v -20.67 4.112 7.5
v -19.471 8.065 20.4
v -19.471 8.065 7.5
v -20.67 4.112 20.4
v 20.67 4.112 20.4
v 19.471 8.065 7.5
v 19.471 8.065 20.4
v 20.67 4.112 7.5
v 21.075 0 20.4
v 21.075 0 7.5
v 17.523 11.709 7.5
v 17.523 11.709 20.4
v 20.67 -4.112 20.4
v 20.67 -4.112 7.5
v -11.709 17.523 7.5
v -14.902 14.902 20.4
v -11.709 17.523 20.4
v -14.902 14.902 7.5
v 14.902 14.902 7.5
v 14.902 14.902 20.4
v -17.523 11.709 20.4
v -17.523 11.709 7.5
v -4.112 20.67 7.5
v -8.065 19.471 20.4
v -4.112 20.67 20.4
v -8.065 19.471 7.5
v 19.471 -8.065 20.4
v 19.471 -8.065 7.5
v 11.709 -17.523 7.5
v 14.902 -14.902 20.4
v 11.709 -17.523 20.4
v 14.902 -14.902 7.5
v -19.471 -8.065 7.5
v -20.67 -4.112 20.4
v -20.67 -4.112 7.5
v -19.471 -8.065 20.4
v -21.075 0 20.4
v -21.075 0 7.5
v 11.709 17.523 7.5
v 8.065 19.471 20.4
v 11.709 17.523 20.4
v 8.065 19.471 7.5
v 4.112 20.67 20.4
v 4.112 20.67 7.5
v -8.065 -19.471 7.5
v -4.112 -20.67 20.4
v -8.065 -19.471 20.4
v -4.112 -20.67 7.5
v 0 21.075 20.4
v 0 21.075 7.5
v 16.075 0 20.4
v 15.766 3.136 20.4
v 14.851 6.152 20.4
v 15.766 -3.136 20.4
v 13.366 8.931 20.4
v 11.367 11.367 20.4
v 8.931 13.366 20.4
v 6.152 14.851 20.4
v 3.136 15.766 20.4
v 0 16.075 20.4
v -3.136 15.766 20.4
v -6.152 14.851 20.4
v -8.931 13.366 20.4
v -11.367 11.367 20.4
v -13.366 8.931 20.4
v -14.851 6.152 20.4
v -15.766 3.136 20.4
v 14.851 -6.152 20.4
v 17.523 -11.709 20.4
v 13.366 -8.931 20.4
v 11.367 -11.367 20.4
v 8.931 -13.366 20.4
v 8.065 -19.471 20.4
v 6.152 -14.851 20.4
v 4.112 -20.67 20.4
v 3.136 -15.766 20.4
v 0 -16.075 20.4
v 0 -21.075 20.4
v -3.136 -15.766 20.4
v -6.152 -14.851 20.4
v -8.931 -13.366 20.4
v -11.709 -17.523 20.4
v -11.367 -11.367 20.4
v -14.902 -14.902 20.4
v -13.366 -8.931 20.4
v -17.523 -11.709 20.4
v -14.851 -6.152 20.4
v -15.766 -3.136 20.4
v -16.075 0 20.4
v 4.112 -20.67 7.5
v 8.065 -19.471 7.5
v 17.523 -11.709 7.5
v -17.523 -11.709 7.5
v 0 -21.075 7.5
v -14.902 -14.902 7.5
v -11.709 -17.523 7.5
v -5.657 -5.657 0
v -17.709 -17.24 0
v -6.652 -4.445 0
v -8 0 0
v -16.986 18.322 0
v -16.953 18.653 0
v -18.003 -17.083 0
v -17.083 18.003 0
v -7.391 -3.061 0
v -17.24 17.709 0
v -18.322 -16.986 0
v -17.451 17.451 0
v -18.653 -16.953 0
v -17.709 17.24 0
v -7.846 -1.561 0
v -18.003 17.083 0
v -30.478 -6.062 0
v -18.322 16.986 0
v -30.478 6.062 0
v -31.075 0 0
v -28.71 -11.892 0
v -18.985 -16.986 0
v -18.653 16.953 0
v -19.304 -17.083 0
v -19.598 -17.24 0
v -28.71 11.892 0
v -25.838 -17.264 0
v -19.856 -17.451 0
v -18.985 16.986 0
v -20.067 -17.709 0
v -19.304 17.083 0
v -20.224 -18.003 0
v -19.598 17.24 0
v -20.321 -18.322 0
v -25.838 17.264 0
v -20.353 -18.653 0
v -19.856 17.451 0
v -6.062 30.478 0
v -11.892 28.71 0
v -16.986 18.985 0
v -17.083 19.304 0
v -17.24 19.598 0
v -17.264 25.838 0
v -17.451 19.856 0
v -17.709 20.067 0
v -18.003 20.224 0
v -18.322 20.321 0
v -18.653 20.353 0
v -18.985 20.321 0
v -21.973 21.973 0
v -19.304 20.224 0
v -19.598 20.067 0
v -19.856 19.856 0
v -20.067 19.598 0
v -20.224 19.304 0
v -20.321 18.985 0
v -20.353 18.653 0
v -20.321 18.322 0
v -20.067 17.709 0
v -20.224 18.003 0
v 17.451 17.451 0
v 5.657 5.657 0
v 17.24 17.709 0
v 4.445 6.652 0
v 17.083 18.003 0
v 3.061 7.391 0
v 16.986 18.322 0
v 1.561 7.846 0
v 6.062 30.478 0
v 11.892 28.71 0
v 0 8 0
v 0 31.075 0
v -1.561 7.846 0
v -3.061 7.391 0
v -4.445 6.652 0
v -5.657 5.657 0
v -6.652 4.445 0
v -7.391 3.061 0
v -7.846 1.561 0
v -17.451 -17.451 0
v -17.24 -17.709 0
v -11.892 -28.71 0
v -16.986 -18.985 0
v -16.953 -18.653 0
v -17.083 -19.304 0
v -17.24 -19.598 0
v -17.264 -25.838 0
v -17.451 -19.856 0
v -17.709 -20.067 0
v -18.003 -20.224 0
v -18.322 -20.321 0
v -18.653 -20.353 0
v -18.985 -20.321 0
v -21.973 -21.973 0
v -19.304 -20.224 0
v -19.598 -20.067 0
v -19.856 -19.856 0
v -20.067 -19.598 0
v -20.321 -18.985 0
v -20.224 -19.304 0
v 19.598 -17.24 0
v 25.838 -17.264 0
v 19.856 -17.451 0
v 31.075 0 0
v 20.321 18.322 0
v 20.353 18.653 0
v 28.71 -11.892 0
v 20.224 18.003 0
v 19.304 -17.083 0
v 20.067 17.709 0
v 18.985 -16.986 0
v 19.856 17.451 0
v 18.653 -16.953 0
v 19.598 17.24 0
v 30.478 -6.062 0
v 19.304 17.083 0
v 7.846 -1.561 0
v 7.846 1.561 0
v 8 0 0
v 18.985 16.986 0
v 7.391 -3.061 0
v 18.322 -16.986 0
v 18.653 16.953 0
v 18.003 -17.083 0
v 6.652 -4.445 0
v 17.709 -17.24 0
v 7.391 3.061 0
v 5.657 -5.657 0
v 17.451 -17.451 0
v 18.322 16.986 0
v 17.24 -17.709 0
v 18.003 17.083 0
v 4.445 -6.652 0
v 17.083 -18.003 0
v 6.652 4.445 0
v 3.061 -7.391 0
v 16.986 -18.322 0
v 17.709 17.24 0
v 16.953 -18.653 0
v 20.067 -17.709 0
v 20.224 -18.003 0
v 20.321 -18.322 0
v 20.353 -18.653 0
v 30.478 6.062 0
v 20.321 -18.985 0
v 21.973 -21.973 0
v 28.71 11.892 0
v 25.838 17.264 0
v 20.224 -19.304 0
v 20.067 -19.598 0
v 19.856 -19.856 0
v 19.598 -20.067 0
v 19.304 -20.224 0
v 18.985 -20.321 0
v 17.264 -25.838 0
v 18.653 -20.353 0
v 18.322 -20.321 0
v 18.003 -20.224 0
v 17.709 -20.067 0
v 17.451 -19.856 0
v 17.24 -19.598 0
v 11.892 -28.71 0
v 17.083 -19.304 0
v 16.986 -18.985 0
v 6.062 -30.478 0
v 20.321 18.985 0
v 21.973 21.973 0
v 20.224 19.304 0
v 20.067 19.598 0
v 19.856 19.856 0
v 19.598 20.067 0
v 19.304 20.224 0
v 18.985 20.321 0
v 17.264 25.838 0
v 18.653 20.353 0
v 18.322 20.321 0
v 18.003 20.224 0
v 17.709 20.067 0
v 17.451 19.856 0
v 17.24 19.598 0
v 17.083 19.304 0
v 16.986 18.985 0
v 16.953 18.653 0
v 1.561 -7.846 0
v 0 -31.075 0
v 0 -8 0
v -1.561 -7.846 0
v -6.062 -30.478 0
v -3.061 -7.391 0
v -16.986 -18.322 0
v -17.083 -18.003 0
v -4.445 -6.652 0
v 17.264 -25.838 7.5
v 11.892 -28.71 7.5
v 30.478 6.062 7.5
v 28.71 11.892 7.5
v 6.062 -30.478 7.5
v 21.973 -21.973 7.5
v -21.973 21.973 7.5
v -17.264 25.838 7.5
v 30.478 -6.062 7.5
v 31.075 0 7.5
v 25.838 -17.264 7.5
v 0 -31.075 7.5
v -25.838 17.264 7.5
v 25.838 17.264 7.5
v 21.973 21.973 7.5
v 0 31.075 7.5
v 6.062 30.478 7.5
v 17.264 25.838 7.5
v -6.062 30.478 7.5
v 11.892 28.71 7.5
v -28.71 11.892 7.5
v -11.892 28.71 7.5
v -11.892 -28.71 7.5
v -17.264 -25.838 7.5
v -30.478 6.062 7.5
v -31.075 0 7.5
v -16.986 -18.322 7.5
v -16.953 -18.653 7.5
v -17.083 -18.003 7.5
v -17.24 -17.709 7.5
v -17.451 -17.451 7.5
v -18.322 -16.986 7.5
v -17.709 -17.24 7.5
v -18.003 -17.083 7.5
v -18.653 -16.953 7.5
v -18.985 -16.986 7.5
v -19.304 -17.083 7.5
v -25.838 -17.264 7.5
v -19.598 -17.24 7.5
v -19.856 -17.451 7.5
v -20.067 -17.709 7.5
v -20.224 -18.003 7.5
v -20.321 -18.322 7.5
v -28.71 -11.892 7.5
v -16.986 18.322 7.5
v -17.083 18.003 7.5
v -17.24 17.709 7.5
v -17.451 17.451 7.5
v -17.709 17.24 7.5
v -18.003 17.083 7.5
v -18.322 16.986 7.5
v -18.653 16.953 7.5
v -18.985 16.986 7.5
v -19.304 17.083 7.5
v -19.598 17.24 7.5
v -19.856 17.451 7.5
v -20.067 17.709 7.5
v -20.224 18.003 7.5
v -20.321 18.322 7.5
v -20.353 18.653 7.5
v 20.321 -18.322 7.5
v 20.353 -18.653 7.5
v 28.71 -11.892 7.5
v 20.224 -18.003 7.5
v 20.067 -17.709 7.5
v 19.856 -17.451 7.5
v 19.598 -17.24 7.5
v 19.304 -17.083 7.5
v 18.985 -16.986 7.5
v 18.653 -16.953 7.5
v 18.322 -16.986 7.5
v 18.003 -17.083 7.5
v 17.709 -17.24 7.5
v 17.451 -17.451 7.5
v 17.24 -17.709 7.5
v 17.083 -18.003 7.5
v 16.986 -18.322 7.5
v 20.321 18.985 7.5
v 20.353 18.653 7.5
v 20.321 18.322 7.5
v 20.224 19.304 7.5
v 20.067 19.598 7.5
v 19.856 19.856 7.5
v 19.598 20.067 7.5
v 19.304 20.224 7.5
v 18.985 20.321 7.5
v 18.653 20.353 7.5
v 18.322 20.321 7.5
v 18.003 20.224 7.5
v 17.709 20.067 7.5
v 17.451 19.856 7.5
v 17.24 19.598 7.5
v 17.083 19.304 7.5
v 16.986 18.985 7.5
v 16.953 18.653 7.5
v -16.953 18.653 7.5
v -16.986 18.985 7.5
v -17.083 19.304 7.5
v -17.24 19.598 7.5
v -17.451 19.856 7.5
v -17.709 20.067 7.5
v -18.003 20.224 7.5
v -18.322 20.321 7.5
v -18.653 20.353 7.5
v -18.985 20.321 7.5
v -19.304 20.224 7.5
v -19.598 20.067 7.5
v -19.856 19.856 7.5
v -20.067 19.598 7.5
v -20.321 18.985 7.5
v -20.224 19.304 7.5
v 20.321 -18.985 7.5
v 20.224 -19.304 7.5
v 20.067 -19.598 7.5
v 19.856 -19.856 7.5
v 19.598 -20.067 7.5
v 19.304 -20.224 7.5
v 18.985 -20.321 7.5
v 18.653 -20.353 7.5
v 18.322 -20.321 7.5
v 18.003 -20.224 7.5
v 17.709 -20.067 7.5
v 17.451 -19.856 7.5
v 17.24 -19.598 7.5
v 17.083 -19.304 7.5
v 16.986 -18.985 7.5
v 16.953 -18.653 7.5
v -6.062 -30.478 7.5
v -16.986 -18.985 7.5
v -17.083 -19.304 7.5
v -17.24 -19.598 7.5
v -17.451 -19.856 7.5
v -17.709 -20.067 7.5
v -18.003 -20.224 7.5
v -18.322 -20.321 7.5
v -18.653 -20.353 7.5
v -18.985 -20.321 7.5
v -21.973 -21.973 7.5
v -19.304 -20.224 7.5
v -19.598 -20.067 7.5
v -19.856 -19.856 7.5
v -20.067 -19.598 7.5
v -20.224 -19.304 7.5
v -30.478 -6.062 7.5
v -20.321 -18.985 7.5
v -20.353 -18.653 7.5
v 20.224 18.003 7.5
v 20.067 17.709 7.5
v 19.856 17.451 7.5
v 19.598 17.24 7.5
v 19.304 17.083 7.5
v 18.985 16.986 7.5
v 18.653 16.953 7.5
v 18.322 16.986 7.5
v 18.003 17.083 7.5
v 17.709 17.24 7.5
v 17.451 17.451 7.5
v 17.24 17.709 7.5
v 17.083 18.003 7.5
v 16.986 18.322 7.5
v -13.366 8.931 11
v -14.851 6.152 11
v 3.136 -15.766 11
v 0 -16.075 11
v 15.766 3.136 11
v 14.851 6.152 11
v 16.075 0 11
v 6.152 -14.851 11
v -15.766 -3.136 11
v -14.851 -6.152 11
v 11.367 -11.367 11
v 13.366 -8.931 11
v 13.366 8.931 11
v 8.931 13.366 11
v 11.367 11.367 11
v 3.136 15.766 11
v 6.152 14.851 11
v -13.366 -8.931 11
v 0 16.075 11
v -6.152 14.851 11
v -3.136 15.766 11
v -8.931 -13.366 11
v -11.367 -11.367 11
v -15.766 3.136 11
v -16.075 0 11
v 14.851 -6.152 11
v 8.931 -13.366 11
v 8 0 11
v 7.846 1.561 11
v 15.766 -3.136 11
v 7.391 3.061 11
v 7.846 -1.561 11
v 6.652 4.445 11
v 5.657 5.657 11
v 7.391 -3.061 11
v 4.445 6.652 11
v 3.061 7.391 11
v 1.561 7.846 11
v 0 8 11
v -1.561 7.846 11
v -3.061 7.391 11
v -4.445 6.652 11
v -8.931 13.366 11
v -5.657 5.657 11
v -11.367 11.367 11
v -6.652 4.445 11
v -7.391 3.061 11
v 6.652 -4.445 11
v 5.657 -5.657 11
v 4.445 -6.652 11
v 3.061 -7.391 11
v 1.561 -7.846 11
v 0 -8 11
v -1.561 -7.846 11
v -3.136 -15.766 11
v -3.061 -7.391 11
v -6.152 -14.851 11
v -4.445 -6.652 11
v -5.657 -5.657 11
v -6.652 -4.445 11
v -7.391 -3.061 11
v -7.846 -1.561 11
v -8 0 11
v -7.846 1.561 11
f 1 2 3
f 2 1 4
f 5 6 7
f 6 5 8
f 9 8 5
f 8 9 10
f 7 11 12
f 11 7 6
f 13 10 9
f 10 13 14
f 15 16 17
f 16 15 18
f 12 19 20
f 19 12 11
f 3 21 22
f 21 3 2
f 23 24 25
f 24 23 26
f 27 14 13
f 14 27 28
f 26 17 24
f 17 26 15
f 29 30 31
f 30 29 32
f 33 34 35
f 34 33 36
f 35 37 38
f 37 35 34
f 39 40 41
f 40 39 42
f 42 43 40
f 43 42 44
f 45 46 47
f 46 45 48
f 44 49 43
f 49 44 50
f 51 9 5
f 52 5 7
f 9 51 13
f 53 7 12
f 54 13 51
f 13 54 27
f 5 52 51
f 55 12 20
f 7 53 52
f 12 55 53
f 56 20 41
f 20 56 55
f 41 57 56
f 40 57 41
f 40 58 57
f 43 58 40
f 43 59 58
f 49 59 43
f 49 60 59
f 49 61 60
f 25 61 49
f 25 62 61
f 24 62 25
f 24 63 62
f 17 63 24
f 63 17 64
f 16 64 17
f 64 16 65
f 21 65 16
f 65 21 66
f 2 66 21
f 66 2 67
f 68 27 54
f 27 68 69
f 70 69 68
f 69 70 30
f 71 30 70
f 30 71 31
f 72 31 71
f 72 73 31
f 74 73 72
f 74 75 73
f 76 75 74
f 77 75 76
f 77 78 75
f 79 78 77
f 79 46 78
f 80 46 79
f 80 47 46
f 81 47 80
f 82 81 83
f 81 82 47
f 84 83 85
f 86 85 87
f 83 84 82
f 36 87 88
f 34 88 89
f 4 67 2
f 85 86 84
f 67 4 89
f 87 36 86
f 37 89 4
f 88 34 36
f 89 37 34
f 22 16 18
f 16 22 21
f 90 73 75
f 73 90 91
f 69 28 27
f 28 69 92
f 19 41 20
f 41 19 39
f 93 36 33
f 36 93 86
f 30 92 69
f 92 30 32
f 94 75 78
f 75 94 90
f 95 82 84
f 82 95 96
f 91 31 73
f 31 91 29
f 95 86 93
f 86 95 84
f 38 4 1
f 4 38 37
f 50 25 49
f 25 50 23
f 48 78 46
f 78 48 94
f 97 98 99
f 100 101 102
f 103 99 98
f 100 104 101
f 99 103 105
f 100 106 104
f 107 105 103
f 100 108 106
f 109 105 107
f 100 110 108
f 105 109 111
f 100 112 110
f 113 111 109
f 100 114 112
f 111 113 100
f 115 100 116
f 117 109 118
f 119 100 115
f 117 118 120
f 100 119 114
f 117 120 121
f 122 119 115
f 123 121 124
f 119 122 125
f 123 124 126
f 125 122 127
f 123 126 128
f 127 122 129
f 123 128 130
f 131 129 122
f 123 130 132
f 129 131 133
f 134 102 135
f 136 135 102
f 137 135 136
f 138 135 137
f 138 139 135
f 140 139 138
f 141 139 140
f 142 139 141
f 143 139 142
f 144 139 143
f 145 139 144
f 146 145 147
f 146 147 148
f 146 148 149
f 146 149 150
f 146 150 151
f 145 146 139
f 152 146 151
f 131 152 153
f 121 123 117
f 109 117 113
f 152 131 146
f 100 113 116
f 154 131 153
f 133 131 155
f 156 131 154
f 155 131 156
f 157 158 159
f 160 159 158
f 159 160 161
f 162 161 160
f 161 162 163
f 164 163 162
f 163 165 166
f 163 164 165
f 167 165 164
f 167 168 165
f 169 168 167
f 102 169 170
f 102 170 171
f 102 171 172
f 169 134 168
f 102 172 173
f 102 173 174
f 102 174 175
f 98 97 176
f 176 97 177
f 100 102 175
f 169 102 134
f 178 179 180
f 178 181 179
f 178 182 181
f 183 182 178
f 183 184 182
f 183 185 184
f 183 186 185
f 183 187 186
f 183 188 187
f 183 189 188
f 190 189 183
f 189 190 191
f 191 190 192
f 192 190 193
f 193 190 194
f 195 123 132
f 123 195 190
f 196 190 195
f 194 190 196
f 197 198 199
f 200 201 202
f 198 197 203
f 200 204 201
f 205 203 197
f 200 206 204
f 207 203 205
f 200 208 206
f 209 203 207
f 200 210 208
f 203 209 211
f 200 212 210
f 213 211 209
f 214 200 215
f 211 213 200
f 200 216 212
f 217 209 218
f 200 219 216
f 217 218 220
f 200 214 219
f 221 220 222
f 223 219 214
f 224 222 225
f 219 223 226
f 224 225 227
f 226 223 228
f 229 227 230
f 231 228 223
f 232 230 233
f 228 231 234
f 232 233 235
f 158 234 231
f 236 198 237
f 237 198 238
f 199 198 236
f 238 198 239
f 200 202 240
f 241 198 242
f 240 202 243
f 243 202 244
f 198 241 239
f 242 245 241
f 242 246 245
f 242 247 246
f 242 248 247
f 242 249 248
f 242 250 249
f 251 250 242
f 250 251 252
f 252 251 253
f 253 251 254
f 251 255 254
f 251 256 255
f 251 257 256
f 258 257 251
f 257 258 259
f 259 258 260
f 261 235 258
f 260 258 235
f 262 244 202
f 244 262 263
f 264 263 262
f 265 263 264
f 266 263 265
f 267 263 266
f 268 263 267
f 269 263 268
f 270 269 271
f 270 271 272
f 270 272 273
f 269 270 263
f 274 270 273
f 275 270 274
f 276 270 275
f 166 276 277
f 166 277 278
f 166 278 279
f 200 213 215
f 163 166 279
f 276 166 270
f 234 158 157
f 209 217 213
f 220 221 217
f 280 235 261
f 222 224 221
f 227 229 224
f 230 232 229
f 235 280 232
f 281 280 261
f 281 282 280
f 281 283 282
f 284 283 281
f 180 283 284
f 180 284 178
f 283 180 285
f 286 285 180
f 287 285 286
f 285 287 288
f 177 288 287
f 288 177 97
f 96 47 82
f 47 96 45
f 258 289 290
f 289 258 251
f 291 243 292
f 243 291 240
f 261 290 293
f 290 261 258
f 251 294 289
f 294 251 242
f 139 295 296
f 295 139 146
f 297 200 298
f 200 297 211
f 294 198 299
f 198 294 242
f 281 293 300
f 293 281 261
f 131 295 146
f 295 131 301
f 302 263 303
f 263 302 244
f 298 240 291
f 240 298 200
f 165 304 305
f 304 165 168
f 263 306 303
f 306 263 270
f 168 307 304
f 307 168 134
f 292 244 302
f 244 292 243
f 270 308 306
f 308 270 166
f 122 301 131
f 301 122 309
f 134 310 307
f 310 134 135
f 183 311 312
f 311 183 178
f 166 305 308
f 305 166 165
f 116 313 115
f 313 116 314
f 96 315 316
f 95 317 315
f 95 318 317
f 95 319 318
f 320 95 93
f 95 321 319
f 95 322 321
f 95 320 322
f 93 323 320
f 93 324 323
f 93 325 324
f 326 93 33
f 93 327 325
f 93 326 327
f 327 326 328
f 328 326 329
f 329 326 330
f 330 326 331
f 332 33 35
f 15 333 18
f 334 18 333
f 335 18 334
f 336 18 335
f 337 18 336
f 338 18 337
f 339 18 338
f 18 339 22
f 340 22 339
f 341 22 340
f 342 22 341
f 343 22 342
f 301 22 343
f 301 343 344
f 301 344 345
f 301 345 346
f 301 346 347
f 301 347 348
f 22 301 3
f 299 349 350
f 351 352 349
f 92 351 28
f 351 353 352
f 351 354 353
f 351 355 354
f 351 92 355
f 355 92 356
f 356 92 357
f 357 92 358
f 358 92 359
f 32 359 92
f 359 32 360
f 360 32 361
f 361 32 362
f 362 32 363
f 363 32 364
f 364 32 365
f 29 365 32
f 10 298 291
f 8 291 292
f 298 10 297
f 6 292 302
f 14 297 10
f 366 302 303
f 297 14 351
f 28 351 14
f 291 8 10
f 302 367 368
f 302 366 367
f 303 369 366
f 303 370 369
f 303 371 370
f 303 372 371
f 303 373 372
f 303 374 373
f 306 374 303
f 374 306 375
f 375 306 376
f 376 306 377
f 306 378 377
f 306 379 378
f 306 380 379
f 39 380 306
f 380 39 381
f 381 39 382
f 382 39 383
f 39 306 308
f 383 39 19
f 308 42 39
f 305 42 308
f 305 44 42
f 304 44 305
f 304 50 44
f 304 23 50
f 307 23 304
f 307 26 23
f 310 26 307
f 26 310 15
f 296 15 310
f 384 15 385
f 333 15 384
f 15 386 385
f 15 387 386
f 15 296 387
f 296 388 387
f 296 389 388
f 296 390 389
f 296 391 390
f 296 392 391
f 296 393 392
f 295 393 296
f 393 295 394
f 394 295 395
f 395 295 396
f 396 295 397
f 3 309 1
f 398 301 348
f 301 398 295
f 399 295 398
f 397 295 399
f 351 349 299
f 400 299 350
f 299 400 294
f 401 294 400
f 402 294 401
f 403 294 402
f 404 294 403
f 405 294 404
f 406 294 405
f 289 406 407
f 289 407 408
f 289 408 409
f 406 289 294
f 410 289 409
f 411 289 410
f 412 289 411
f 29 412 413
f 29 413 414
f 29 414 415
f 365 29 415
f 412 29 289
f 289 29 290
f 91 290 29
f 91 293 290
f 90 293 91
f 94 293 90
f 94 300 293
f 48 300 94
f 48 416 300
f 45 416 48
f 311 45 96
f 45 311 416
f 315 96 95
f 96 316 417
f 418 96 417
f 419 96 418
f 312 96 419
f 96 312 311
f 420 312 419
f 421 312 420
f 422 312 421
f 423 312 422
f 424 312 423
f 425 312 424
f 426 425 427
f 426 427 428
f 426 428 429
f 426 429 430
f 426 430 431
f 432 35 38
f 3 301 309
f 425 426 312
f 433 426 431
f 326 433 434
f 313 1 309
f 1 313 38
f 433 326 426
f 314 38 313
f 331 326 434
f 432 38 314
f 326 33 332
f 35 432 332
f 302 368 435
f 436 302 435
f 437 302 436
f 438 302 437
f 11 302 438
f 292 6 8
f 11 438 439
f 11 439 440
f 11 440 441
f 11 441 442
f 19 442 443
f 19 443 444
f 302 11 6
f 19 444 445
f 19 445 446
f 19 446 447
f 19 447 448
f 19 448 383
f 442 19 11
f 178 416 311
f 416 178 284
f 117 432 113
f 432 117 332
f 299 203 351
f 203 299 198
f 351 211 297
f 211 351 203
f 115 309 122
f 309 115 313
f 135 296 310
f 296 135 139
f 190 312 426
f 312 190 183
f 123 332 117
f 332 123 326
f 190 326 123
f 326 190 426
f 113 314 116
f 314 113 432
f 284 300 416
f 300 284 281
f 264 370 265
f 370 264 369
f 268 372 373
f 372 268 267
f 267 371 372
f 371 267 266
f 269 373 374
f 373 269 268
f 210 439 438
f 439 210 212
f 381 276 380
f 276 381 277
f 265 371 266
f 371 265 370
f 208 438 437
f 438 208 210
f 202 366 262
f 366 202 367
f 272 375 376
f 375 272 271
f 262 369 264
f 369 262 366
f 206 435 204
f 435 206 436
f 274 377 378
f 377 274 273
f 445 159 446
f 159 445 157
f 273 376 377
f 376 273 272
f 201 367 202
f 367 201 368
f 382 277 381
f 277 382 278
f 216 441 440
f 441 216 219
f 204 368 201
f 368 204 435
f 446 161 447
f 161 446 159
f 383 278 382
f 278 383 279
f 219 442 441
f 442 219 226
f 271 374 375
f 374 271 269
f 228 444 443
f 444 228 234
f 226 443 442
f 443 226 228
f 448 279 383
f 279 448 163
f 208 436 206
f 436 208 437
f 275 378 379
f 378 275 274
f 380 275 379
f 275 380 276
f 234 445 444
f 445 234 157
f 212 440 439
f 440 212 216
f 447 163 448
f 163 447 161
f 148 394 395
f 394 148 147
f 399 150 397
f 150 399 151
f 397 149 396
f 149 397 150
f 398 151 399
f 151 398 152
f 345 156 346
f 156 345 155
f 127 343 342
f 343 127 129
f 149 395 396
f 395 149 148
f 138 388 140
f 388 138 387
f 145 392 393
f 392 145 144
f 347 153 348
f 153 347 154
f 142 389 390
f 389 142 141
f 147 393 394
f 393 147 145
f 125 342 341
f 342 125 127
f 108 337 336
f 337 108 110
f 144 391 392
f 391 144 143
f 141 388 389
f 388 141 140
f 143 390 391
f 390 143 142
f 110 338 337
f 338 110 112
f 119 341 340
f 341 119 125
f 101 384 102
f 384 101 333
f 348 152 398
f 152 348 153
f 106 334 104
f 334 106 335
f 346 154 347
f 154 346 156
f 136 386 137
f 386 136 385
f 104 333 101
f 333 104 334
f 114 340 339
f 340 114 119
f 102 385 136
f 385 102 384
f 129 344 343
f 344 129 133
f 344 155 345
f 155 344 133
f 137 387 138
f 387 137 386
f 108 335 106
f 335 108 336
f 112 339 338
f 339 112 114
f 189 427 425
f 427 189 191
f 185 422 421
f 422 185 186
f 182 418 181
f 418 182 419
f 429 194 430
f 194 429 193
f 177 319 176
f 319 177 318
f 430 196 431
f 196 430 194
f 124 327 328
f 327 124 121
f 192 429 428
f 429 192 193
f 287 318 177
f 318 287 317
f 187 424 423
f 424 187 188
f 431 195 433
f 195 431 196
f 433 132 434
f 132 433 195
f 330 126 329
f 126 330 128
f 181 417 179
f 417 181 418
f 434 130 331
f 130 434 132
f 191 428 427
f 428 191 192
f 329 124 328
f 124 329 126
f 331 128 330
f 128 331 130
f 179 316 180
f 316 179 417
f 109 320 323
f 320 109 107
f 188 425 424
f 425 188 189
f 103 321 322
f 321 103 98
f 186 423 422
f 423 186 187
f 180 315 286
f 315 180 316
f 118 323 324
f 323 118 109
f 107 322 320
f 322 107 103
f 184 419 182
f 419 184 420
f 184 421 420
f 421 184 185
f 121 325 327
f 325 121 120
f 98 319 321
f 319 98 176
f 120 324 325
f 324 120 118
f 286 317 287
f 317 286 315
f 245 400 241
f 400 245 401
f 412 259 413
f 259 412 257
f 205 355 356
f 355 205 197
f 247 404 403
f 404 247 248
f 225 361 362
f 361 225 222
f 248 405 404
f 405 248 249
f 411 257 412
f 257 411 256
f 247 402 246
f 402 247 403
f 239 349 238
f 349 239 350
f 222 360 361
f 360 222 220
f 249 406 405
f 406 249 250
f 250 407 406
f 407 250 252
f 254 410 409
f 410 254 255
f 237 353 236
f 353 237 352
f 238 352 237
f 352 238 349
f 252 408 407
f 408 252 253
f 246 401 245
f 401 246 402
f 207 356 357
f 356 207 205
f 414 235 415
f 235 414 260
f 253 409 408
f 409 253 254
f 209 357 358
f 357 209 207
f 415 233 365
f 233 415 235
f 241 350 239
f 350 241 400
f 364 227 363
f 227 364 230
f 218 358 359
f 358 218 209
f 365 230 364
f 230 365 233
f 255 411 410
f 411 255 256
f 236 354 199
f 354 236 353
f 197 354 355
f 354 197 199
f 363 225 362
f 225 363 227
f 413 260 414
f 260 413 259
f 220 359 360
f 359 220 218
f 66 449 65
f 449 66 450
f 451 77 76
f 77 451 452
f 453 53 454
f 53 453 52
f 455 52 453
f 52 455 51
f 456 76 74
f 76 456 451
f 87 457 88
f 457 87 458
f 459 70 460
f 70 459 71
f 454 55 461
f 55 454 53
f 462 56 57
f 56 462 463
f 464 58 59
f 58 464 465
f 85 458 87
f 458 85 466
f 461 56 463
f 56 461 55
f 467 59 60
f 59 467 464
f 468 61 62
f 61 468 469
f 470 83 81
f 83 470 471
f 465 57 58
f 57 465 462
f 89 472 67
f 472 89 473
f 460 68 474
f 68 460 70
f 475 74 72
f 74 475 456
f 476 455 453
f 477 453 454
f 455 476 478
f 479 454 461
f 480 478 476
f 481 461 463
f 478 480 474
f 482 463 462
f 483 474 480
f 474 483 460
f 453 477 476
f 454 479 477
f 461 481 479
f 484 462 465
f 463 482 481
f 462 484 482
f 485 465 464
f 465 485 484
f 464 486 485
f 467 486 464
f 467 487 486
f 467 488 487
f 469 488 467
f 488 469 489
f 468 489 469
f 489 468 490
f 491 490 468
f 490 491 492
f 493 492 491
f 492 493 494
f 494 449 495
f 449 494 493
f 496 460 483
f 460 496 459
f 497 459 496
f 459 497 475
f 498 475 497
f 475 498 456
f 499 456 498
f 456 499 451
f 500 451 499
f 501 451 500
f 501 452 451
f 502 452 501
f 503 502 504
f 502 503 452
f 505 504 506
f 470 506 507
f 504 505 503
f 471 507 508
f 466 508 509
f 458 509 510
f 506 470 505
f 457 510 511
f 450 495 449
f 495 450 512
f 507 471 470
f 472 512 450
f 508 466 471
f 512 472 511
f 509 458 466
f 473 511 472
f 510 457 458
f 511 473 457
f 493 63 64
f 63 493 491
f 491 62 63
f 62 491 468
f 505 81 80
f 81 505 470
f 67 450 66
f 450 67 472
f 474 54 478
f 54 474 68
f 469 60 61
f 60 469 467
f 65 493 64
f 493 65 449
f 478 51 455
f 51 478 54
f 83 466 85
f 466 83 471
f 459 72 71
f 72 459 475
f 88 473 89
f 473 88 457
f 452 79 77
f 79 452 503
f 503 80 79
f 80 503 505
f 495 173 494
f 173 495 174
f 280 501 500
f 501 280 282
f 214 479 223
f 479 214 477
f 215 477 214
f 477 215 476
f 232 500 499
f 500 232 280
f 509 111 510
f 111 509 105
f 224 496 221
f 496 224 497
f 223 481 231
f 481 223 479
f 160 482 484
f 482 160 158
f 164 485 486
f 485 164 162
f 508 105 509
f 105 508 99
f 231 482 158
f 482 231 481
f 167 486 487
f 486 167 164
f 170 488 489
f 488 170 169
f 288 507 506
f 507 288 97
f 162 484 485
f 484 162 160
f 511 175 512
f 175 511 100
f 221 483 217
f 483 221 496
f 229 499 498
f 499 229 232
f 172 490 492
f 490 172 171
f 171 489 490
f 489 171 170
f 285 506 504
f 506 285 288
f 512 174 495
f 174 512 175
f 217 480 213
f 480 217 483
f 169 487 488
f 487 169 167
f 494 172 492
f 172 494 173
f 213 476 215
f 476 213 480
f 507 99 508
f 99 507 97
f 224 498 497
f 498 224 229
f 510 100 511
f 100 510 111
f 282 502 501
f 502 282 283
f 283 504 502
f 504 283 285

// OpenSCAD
$fn = 32;

// ----------------------------------------------------------------------
// Bearing housing: seat for 6002 (32 x 9 mm), 42.15 mm body
// ----------------------------------------------------------------------

// --- parameters (mm) ---
body_od = 42.15;          // housing outside diameter
body_h = 20.4;            // overall housing height
wall = 5;                 // wall thickness
pocket_d = 32.15;         // 6002 seat, 0.15 mm clearance
seat_h = 9.4;             // pocket depth
shoulder = 5;             // shoulder under the bearing
pass_d = 16;              // shaft passage
flange_dia = 62.15;       // mounting flange diameter
flange_t = 6;             // flange thickness
bolt_d = 3.4;             // flange bolt clearance
bolt_r = 26.38;           // flange bolt circle radius

module body() {
  cylinder(h = body_h, d = body_od);
}

module flange() {
  /* flange sunk 1.5 mm into the body */
  cylinder(h = flange_t + 1.5, d = flange_dia);
}

difference() {
  union() {
    body();
    flange();
  }
  translate([0, 0, body_h - seat_h]) cylinder(h = seat_h + 1, d = pocket_d);
  translate([0, 0, -1]) cylinder(h = body_h - seat_h + 1, d = pass_d);
  for (i = [0 : 3]) rotate([0, 0, 45 + i * 90]) translate([bolt_r, 0, -1])
    cylinder(h = flange_t + 3, d = bolt_d);
}
